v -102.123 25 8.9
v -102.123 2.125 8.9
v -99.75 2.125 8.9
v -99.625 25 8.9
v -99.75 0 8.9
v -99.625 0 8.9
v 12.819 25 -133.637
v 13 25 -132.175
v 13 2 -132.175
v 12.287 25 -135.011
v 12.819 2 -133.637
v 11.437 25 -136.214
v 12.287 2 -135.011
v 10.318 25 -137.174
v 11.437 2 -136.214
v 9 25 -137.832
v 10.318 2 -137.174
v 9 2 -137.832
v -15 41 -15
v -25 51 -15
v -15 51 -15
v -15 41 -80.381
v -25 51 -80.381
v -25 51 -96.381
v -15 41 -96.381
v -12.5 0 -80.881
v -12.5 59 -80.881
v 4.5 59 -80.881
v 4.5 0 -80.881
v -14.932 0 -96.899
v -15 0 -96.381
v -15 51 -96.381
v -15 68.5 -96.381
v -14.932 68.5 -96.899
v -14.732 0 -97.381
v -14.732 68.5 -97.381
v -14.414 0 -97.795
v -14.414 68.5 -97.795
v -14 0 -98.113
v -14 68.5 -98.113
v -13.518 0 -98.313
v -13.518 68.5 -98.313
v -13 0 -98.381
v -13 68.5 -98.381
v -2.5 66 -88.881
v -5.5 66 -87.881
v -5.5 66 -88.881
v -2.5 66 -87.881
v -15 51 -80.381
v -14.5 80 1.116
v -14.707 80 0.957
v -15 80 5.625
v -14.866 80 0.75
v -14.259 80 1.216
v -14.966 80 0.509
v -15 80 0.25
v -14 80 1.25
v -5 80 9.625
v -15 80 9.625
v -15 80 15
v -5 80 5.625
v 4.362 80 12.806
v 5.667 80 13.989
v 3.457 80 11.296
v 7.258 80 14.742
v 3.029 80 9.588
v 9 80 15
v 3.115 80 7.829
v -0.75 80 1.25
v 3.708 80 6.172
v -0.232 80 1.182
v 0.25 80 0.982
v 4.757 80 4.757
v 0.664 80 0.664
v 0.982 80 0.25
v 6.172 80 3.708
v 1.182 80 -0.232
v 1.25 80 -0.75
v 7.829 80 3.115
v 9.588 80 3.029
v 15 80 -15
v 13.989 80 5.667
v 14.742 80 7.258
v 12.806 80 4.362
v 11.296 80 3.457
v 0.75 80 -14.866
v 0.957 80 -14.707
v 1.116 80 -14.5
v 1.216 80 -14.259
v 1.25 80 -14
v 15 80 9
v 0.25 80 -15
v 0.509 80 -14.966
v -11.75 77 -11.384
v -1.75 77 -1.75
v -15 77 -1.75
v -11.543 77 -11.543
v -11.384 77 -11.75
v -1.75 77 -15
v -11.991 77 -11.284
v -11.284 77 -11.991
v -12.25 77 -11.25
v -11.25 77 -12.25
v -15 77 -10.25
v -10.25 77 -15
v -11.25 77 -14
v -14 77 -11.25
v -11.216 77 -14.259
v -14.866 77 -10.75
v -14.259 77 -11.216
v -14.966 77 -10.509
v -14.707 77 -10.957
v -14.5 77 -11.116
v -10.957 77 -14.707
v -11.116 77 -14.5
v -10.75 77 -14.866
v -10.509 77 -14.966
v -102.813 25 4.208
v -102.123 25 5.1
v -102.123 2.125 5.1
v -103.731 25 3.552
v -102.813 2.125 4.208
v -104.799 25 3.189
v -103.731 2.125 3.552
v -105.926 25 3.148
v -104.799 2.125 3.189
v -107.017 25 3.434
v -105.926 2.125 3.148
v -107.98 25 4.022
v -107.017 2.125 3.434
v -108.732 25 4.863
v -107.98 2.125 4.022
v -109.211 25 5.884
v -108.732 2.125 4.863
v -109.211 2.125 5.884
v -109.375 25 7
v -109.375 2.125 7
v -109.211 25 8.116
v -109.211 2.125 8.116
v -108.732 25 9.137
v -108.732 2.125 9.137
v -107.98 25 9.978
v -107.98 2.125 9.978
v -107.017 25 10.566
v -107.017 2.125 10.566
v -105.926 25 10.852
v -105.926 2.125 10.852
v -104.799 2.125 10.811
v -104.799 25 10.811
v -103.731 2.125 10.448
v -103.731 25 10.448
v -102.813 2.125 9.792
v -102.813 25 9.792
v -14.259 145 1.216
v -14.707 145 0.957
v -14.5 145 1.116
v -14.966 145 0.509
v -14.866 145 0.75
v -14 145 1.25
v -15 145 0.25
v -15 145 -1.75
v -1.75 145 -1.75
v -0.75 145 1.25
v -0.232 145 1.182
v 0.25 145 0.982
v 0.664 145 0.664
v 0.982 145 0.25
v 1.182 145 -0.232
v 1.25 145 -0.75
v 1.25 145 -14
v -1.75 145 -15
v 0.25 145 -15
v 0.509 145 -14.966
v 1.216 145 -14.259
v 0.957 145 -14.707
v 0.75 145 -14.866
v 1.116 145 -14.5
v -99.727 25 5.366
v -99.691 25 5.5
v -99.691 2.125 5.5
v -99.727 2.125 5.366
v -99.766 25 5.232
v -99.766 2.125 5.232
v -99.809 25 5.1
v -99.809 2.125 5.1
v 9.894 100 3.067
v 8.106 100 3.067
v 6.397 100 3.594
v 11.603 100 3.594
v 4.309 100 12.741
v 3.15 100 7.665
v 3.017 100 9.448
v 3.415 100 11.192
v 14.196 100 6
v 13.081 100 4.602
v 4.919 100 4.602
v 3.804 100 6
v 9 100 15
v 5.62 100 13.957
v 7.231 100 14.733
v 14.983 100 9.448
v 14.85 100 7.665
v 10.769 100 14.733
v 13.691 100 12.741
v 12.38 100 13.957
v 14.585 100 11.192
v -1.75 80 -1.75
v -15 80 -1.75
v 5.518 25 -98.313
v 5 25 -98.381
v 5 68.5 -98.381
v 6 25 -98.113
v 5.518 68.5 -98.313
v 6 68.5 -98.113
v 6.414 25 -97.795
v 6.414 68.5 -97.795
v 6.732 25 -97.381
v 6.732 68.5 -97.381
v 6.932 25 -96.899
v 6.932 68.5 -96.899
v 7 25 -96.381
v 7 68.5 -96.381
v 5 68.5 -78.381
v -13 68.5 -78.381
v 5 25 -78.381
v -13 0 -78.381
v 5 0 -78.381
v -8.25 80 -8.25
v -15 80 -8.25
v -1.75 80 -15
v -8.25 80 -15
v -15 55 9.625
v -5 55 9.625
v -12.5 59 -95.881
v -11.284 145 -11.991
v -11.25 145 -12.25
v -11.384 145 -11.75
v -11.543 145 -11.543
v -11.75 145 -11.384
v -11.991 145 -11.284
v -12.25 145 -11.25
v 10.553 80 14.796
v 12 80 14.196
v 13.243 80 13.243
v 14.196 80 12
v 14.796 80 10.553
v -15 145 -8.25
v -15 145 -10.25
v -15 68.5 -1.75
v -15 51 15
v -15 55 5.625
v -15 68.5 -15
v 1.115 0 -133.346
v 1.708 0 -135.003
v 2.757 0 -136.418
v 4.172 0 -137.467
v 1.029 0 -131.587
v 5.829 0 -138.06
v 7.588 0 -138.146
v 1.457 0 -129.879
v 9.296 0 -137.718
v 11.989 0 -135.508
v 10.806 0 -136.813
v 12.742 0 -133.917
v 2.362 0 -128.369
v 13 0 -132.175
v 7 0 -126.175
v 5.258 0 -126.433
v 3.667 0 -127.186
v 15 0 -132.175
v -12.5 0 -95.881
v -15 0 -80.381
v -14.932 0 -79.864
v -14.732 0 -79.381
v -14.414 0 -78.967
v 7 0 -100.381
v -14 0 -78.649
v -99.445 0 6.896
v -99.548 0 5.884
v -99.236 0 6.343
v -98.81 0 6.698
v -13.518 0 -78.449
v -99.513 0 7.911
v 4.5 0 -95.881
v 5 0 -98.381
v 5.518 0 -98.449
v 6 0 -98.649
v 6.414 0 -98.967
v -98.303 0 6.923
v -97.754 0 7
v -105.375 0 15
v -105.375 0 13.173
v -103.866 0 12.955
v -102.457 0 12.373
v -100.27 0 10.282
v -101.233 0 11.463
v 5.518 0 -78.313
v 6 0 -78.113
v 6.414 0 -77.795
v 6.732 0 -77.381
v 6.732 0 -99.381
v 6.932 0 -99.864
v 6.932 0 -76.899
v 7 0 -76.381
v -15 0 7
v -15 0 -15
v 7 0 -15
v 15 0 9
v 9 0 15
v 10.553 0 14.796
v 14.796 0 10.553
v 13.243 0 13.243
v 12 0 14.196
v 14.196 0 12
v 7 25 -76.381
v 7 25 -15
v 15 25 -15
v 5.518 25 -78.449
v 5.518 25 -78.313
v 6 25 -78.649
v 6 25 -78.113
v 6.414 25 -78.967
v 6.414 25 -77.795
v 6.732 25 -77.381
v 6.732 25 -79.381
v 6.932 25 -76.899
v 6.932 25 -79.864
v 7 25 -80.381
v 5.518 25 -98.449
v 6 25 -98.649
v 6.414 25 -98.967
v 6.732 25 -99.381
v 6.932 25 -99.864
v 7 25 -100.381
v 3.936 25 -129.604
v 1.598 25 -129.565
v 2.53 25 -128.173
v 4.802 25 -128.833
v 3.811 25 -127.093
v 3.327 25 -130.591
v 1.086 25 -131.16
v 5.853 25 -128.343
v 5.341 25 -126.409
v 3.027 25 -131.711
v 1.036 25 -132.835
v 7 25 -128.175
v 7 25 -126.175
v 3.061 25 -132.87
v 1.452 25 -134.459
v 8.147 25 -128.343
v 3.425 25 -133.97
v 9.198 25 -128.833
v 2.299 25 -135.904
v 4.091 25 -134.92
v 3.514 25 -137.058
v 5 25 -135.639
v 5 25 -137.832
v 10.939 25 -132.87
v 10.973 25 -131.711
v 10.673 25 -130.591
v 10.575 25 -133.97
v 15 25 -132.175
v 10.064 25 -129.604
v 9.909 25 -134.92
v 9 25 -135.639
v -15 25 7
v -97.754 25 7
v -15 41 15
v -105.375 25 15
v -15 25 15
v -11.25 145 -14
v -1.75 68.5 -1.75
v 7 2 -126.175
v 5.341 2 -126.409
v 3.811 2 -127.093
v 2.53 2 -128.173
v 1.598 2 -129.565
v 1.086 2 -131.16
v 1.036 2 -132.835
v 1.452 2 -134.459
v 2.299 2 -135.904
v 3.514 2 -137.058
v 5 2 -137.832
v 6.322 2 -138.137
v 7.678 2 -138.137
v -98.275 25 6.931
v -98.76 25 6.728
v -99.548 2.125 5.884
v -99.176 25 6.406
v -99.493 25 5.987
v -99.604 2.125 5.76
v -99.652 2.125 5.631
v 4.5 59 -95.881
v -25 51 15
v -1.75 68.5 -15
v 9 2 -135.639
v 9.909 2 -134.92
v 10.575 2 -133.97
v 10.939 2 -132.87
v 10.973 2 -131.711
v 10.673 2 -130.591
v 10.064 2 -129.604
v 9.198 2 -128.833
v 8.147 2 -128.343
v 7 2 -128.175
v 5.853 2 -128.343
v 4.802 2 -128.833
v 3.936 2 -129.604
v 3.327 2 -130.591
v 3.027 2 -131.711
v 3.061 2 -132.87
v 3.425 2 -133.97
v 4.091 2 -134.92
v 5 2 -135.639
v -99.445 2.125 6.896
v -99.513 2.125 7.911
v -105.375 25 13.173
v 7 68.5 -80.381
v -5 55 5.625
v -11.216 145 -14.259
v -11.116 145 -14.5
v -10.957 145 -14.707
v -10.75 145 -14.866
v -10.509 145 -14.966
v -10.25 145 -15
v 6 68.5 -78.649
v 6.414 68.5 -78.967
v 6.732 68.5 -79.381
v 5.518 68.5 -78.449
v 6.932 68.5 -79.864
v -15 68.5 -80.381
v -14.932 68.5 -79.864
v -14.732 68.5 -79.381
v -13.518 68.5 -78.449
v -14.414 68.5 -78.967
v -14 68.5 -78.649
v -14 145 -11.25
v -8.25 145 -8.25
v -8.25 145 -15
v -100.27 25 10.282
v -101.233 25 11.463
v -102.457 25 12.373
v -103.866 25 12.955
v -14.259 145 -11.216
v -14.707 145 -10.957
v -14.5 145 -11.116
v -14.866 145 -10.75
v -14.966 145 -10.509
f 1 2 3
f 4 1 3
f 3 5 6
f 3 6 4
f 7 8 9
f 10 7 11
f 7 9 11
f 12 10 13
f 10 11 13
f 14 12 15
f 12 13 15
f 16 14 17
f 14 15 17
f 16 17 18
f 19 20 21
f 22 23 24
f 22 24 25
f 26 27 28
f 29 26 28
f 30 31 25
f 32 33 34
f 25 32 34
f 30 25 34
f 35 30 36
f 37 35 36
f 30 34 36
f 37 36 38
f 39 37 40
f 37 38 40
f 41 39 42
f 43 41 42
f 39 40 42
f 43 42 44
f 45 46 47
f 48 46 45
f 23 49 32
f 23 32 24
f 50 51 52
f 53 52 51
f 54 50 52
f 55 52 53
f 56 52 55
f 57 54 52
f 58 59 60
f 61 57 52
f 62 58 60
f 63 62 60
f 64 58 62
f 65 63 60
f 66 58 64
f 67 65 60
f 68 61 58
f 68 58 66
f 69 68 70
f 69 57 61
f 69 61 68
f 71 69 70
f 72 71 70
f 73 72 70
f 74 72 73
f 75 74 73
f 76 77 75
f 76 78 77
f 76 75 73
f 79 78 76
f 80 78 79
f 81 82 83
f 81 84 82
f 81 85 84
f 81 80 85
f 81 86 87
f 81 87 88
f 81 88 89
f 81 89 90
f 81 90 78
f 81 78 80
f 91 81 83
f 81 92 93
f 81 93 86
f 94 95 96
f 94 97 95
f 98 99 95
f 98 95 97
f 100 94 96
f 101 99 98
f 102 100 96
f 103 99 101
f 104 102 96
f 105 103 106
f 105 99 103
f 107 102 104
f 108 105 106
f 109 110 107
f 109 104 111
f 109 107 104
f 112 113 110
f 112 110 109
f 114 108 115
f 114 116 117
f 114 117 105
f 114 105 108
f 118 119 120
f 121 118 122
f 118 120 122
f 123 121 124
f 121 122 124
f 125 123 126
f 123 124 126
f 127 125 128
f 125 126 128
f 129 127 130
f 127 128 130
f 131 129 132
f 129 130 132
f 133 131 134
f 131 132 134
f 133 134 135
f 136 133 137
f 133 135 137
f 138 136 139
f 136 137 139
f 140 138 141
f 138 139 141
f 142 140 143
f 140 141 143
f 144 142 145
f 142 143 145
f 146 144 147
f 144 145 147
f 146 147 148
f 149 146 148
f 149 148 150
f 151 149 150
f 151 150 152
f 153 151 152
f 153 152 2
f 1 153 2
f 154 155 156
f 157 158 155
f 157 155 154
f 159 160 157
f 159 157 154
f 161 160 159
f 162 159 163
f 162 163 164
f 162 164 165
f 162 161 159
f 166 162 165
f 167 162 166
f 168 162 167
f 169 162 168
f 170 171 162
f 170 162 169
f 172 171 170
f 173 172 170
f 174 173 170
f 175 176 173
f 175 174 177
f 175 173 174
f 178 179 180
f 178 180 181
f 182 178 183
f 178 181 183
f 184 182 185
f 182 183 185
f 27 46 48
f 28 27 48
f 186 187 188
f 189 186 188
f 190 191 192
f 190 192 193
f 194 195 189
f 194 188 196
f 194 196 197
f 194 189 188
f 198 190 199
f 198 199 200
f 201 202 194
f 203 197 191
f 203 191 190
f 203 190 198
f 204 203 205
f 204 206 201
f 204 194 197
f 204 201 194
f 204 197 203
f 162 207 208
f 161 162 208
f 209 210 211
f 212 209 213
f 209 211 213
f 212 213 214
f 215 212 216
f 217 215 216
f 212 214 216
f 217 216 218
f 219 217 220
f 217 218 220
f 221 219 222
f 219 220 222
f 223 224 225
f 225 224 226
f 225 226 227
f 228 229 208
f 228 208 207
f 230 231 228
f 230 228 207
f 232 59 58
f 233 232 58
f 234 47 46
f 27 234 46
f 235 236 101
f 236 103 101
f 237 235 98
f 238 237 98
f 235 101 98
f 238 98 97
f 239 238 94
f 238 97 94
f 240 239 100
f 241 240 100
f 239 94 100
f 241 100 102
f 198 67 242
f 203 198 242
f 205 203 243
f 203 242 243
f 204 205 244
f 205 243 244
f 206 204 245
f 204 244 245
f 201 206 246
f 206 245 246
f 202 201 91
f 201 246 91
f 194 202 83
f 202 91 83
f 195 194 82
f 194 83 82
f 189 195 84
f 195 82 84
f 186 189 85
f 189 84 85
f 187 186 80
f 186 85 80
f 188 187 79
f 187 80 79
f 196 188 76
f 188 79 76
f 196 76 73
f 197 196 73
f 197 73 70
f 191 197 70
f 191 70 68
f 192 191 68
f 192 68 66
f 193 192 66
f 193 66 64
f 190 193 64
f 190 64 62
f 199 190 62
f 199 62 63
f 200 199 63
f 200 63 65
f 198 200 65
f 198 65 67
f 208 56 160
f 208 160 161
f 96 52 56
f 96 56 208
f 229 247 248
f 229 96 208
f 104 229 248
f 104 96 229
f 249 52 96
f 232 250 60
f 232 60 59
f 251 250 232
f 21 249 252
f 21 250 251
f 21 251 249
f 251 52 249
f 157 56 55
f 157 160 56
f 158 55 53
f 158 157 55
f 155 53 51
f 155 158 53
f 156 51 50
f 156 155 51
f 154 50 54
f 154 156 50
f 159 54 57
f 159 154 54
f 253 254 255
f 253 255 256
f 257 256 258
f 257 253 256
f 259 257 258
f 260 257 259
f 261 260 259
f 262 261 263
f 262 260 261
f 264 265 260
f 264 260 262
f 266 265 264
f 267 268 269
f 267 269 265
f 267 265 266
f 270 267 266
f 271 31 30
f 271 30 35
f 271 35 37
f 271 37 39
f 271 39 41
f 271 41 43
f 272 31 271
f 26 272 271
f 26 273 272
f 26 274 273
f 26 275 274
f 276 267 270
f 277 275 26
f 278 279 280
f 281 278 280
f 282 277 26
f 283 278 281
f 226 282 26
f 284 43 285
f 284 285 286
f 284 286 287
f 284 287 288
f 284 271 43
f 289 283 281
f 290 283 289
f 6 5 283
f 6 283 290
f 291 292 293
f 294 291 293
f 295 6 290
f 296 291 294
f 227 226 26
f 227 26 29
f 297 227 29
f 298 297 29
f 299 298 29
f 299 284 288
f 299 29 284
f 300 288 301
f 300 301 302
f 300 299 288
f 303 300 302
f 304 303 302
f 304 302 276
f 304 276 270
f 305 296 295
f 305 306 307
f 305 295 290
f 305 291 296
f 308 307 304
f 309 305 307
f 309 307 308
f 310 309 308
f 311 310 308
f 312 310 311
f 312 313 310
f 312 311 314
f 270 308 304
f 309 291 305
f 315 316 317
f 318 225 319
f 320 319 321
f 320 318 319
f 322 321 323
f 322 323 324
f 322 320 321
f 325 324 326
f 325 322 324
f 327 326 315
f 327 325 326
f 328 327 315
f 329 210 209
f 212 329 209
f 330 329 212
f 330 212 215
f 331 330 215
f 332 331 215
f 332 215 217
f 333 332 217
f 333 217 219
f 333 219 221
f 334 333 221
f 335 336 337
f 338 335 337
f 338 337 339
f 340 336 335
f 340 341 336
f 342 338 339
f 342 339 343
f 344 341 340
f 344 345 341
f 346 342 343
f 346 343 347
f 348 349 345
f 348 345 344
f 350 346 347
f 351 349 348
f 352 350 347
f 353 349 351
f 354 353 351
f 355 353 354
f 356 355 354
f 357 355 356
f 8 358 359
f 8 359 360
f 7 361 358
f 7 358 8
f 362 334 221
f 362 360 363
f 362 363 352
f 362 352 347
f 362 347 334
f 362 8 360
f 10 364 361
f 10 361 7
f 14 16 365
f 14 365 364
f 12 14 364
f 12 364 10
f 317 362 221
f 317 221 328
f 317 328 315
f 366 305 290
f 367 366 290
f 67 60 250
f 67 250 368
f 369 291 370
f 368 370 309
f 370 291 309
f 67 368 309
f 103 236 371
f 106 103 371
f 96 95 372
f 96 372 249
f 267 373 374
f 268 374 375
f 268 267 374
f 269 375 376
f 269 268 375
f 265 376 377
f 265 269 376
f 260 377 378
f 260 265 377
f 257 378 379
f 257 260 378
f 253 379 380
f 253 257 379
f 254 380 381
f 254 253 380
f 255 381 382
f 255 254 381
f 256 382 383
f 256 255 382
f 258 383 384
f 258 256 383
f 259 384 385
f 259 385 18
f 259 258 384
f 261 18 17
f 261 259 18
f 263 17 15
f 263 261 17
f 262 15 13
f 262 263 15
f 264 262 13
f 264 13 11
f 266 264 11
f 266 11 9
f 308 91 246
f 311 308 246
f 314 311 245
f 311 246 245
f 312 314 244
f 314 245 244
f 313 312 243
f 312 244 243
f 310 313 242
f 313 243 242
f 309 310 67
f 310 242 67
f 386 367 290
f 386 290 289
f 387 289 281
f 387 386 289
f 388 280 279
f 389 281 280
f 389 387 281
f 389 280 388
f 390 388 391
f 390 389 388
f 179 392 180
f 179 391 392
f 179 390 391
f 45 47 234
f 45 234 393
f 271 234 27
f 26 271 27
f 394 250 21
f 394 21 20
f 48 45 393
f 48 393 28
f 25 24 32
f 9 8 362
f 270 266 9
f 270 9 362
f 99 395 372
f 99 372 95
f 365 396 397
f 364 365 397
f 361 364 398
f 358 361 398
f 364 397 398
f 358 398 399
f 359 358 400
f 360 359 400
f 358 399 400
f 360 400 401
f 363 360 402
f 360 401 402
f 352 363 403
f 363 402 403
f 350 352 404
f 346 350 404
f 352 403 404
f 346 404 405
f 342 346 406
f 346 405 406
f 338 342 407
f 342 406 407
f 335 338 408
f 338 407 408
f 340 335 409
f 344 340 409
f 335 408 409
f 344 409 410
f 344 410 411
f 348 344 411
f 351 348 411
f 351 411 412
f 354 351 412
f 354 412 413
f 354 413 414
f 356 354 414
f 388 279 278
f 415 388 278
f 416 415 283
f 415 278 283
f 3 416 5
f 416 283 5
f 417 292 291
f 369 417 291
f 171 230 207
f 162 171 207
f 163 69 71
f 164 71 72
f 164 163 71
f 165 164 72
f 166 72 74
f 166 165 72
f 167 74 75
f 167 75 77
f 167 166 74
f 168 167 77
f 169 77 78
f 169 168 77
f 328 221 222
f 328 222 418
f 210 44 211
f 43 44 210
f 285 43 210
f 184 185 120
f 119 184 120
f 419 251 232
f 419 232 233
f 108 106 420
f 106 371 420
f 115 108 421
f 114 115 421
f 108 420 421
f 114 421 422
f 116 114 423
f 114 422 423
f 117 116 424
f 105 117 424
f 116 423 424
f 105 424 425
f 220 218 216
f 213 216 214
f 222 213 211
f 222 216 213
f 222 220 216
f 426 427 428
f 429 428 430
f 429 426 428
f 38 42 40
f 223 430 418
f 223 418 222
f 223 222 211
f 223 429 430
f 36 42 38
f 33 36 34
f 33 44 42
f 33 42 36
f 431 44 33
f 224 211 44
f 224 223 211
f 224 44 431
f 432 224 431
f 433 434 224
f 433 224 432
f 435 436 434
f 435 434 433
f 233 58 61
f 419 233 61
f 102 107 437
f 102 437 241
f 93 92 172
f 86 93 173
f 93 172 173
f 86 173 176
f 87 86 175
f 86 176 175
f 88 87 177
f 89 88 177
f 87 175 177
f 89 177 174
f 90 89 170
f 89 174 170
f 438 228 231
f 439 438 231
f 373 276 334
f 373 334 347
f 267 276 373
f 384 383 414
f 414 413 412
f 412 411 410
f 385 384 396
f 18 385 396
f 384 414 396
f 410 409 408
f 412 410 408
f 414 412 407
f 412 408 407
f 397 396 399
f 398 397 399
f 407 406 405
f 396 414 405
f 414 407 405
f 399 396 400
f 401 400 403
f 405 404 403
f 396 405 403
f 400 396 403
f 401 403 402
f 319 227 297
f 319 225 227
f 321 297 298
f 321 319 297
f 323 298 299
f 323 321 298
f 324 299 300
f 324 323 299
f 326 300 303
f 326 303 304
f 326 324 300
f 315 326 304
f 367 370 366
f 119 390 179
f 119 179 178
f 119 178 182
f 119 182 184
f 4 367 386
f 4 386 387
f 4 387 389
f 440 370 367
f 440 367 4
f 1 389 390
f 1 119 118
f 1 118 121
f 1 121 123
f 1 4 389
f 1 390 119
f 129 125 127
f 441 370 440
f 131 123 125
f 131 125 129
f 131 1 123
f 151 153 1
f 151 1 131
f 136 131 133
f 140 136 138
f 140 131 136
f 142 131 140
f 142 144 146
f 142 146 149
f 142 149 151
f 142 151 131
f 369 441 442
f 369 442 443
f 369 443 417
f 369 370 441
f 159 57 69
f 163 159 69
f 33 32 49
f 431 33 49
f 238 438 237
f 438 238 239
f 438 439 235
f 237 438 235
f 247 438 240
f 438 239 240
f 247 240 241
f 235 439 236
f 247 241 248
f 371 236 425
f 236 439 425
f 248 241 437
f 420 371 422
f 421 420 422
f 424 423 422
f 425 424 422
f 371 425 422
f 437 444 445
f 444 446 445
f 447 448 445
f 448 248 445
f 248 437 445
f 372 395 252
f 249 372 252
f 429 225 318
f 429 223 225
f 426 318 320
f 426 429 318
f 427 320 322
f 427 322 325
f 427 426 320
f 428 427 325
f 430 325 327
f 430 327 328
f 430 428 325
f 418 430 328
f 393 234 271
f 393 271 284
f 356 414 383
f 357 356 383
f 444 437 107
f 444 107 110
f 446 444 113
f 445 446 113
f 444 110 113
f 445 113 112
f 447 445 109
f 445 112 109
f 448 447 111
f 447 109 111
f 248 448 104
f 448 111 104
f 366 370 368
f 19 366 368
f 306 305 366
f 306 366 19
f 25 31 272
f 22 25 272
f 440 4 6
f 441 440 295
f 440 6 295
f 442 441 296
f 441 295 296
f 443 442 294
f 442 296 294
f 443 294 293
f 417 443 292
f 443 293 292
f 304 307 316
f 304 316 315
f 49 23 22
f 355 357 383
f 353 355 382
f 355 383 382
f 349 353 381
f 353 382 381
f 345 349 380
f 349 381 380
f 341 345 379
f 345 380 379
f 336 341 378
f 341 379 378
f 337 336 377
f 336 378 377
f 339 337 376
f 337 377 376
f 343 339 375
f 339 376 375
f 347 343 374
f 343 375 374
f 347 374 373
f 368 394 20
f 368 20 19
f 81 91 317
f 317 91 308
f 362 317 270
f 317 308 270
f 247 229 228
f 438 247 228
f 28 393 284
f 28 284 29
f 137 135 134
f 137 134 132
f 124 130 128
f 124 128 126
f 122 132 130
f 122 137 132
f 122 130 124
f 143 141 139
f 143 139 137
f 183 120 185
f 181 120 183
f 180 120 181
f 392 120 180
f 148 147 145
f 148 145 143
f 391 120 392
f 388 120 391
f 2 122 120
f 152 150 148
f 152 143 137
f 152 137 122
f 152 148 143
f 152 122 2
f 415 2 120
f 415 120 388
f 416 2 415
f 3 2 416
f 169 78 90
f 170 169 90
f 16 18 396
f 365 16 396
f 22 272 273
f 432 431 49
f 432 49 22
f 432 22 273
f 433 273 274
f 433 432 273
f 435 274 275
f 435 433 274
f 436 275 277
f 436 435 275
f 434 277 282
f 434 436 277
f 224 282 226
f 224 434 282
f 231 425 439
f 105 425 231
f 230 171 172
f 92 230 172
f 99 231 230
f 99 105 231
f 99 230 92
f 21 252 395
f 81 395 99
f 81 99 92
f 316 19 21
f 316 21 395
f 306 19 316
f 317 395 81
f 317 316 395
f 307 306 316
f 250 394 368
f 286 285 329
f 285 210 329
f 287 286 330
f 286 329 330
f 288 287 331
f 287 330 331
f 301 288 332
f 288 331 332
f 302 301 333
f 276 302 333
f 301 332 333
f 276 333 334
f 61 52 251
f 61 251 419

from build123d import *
from build123d.topology import SkipClean

# Parameters (mm, degrees)
SKETCH1_W                 = 30
SKETCH1_H                 = 30
BOSS_EXTRUDE1_DEPTH       = 80
SKETCH2_R                 = 6
BOSS_EXTRUDE2_DEPTH       = 20
CUT_EXTRUDE1_DEPTH        = 83.764726786
BOSS_EXTRUDE3_DEPTH       = 65
BOSS_EXTRUDE5_DEPTH       = 2
BOSS_EXTRUDE6_DEPTH       = 23
BOSS_EXTRUDE7_DEPTH       = 25
FILLET1_R                 = 2
SKETCH11_R                = 6.055782361
CUT_EXTRUDE2_DEPTH        = 2.125
SKETCH12_W                = 13.25
SKETCH12_H                = 8.5
CUT_EXTRUDE3_DEPTH        = 13.25
FILLET2_R                 = 2
CUT_EXTRUDE4_REACH        = 195.534
SKETCH14_W                = 3.75
SKETCH14_H                = 3.75
FILLET3_R                 = 1
SKETCH15_W                = 10
SKETCH15_H                = 4
CUT_EXTRUDE5_DEPTH        = 25
BOSS_EXTRUDE8_REACH       = 230.211
SKETCH17_W                = 22
SKETCH17_H                = 20
SKETCH18_W                = 17
SKETCH18_H                = 15
CUT_EXTRUDE6_DEPTH        = 66
FILLET4_R                 = 2
FILLET5_R                 = 2
CHAMFER1_SIZE             = 7
BOSS_EXTRUDE9_DEPTH       = 30
BOSS_EXTRUDE10_DEPTH      = 8
BOSS_EXTRUDE10_DEPTH_BACK = 8


with BuildPart() as part:
    # Sketch1 → Boss-Extrude1 (new body)
    with BuildSketch(Plane(origin=(0, 0, 0), x_dir=(1, 0, 0), z_dir=(0, 1, 0))):
        Rectangle(SKETCH1_W, SKETCH1_H)
    extrude(amount=BOSS_EXTRUDE1_DEPTH)

    # Sketch2 → Boss-Extrude2 (add)
    with BuildSketch(Plane(origin=(0, 80, 0), x_dir=(1, 0, 0), z_dir=(0, 1, 0))):
        with Locations(Location((9, -9, 0), (0, 0, 270))):
            Circle(SKETCH2_R)
    extrude(amount=BOSS_EXTRUDE2_DEPTH)

    # Sketch3 → Cut-Extrude1 (cut, through all)
    with BuildSketch(Plane(origin=(0, 80, 0), x_dir=(1, 0, 0), z_dir=(0, 1, 0))):
        with BuildLine():
            Line((9, -15), (15, -15))
            Line((15, -15), (15, -9))
            ThreePointArc((15, -9), (13.242640687, -13.242640687), (9, -15))
        make_face()
    extrude(amount=-CUT_EXTRUDE1_DEPTH, mode=Mode.SUBTRACT)

    # Sketch4 → Boss-Extrude3 (add)
    with BuildSketch(Plane(origin=(0, 80, 0), x_dir=(1, 0, 0), z_dir=(0, 1, 0))):
        Polygon((-8.25, 11.25), (-8.25, 8.25), (-11.25, 8.25), (-15, 8.25), (-15, 11.25), (-11.25, 11.25), (-11.25, 15), (-8.25, 15), align=None)
        Polygon((-1.75, 1.75), (-11.25, 1.75), (-15, 1.75), (-15, -1.25), (-11.25, -1.25), (1.25, -1.25), (1.25, 11.25), (1.25, 15), (-1.75, 15), (-1.75, 11.25), align=None)
    extrude(amount=BOSS_EXTRUDE3_DEPTH)

    # Sketch6 → Boss-Extrude5 (add)
    with BuildSketch(Plane.XZ):
        with BuildLine():
            Line((15, -15), (7, -15))
            Line((7, -15), (7, -126.175))
            ThreePointArc((7, -126.175), (2.757359313, -136.417640687), (13, -132.175))
            Line((13, -132.175), (15, -132.175))
            Line((15, -132.175), (15, -15))
        make_face()
    extrude(amount=-BOSS_EXTRUDE5_DEPTH)

    # Sketch7 → Boss-Extrude6 (add)
    with SkipClean():  # the faces are left unmerged after this step: merging them gives an invalid solid
        with BuildSketch(Plane(origin=(0, 2, 0), x_dir=(1, 0, 0), z_dir=(0, 1, 0))):
            with BuildLine():
                Line((9, 137.831854249), (9, 135.639101615))
                ThreePointArc((9, 135.639101615), (7, 128.175), (5, 135.639101615))
                Line((5, 135.639101615), (5, 137.831854249))
                ThreePointArc((5, 137.831854249), (1.086408642, 131.160388128), (7, 126.175))
                Line((7, 126.175), (7, 15))
                Line((7, 15), (15, 15))
                Line((15, 15), (15, 132.175))
                Line((15, 132.175), (13, 132.175))
                ThreePointArc((13, 132.175), (11.898979486, 135.639101615), (9, 137.831854249))
            make_face()
        extrude(amount=BOSS_EXTRUDE6_DEPTH)

    # Sketch9 → Boss-Extrude7 (add)
    with SkipClean():  # the faces are left unmerged after this step: merging them gives an invalid solid
        with BuildSketch(Plane.XZ):
            with BuildLine():
                Line((-15, 15), (-15, 7))
                Line((-15, 7), (-99.5, 7))
                ThreePointArc((-99.5, 7), (-99.577697751, 6.037536458), (-99.80877869, 5.1))
                Line((-99.80877869, 5.1), (-102.122778509, 5.1))
                ThreePointArc((-102.122778509, 5.1), (-109.375, 7), (-102.122778509, 8.9))
                Line((-102.122778509, 8.9), (-99.625, 8.9))
                ThreePointArc((-99.625, 8.9), (-101.816885554, 11.955834237), (-105.375001601, 13.173329766))
                Line((-105.375001601, 13.173329766), (-105.375001601, 15))
                Line((-105.375001601, 15), (-15, 15))
            make_face()
        extrude(amount=-BOSS_EXTRUDE7_DEPTH)

    # Fillet1
    fillet1_edges = [part.edges().sort_by_distance(p)[0] for p in [
        (-99.5, 12.5, 7),
    ]]
    fillet(fillet1_edges, radius=FILLET1_R)

    # Sketch11 → Cut-Extrude2 (cut)
    with SkipClean():  # the faces are left unmerged after this step: merging them gives an invalid solid
        with BuildSketch(Plane.XZ):
            with Locations((-105.5, 7)):
                Circle(SKETCH11_R)
        extrude(amount=-CUT_EXTRUDE2_DEPTH, mode=Mode.SUBTRACT)

    # Sketch12 → Cut-Extrude3 (cut)
    with SkipClean():  # the faces are left unmerged after this step: merging them gives an invalid solid
        with BuildSketch(Plane(origin=(0, 0, -15), x_dir=(-1, 0, 0), z_dir=(0, 0, -1))):
            with Locations((8.375, 72.75)):
                Rectangle(SKETCH12_W, SKETCH12_H)
        extrude(amount=-CUT_EXTRUDE3_DEPTH, mode=Mode.SUBTRACT)

    # Fillet2
    fillet2_edges = [part.edges().sort_by_distance(p)[0] for p in [
        (1.25, 112.5, 1.25),
    ]]
    fillet(fillet2_edges, radius=FILLET2_R)

    # Sketch14 → Cut-Extrude4 (cut, up to next)
    with BuildSketch(Plane(origin=(0, 80, 0), x_dir=(1, 0, 0), z_dir=(0, 1, 0)), mode=Mode.PRIVATE) as cut_extrude4_sk1:
        with Locations((-13.125, 13.125)):
            Rectangle(SKETCH14_W, SKETCH14_H)
    cut_extrude4_tool1 = extrude(cut_extrude4_sk1.sketch, amount=-CUT_EXTRUDE4_REACH, mode=Mode.PRIVATE) & part.part
    add(cut_extrude4_tool1.solids().sort_by_distance((-13.125, 80, -13.125))[0], mode=Mode.SUBTRACT)

    # Fillet3
    fillet3_edges = [part.edges().sort_by_distance(p)[0] for p in [
        (-11.25, 112.5, -15),
        (-11.25, 112.5, -11.25),
        (-15, 112.5, -11.25),
        (-15, 112.5, 1.25),
        (1.25, 112.5, -15),
    ]]
    fillet(fillet3_edges, radius=FILLET3_R)

    # Sketch15 → Cut-Extrude5 (cut)
    with SkipClean():  # the faces are left unmerged after this step: merging them gives an invalid solid
        with BuildSketch(Plane(origin=(0, 80, 0), x_dir=(1, 0, 0), z_dir=(0, 1, 0))):
            with Locations((-10, -7.625)):
                Rectangle(SKETCH15_W, SKETCH15_H)
        extrude(amount=-CUT_EXTRUDE5_DEPTH, mode=Mode.SUBTRACT)

    # Boss-Extrude8: up to this face of the body (flat: up to its plane)
    boss_extrude8_end = Plane(part.part.faces().sort_by_distance((-8.375, 68.5, -8.375))[0])
    # Sketch17 → Boss-Extrude8 (add, up to the picked face)
    with BuildSketch(Plane.XZ, mode=Mode.PRIVATE) as boss_extrude8_sk1:
        with Locations((-4, -88.38125)):
            Rectangle(SKETCH17_W, SKETCH17_H)
    boss_extrude8_tool1 = split(extrude(boss_extrude8_sk1.sketch, amount=-BOSS_EXTRUDE8_REACH, mode=Mode.PRIVATE), bisect_by=boss_extrude8_end, keep=Keep.BOTH, mode=Mode.PRIVATE)
    add(boss_extrude8_tool1.solids().sort_by(Axis((-4, 0, -88.38125), (0, 1, 0)))[0])

    # Sketch18 → Cut-Extrude6 (cut)
    with SkipClean():  # the faces are left unmerged after this step: merging them gives an invalid solid
        with BuildSketch(Plane.XZ):
            with Locations((-4, -88.38125)):
                Rectangle(SKETCH18_W, SKETCH18_H)
        extrude(amount=-CUT_EXTRUDE6_DEPTH, mode=Mode.SUBTRACT)

    # Fillet4
    fillet4_edges = [part.edges().sort_by_distance(p)[0] for p in [
        (7, 13.5, -78.38125),
        (7, 13.5, -98.38125),
        (-15, 34.25, -98.38125),
        (-15, 34.25, -78.38125),
    ]]
    fillet(fillet4_edges, radius=FILLET4_R)

    # Fillet5
    fillet5_edges = [part.edges().sort_by_distance(p)[0] for p in [
        (7, 46.75, -78.38125),
        (7, 46.75, -98.38125),
    ]]
    fillet(fillet5_edges, radius=FILLET5_R)

    # Chamfer1
    chamfer1_edges = [part.edges().sort_by_distance(p)[0] for p in [
        (-12.5, 66, -88.38125),
        (-4, 66, -80.88125),
        (4.5, 66, -88.38125),
        (-4, 66, -95.88125),
    ]]
    chamfer(chamfer1_edges, length=CHAMFER1_SIZE)

    # Sketch19 → Boss-Extrude9 (add)
    with SkipClean():  # the faces are left unmerged after this step: merging them gives an invalid solid
        with BuildSketch(Plane.XY.offset(15)):
            Polygon((-15, 41), (-15, 51), (-25, 51), align=None)
        extrude(amount=-BOSS_EXTRUDE9_DEPTH)

    # Sketch20 → Boss-Extrude10 (add, two sides: drawn at the far end of the back side and taken through both)
    with SkipClean():  # the faces are left unmerged after this step: merging them gives an invalid solid
        with BuildSketch(Plane.XY.offset(-88.38125).offset(-BOSS_EXTRUDE10_DEPTH_BACK)):
            Polygon((-15, 41), (-15, 51), (-25, 51), align=None)
        extrude(amount=BOSS_EXTRUDE10_DEPTH + BOSS_EXTRUDE10_DEPTH_BACK)


solid = part.part
